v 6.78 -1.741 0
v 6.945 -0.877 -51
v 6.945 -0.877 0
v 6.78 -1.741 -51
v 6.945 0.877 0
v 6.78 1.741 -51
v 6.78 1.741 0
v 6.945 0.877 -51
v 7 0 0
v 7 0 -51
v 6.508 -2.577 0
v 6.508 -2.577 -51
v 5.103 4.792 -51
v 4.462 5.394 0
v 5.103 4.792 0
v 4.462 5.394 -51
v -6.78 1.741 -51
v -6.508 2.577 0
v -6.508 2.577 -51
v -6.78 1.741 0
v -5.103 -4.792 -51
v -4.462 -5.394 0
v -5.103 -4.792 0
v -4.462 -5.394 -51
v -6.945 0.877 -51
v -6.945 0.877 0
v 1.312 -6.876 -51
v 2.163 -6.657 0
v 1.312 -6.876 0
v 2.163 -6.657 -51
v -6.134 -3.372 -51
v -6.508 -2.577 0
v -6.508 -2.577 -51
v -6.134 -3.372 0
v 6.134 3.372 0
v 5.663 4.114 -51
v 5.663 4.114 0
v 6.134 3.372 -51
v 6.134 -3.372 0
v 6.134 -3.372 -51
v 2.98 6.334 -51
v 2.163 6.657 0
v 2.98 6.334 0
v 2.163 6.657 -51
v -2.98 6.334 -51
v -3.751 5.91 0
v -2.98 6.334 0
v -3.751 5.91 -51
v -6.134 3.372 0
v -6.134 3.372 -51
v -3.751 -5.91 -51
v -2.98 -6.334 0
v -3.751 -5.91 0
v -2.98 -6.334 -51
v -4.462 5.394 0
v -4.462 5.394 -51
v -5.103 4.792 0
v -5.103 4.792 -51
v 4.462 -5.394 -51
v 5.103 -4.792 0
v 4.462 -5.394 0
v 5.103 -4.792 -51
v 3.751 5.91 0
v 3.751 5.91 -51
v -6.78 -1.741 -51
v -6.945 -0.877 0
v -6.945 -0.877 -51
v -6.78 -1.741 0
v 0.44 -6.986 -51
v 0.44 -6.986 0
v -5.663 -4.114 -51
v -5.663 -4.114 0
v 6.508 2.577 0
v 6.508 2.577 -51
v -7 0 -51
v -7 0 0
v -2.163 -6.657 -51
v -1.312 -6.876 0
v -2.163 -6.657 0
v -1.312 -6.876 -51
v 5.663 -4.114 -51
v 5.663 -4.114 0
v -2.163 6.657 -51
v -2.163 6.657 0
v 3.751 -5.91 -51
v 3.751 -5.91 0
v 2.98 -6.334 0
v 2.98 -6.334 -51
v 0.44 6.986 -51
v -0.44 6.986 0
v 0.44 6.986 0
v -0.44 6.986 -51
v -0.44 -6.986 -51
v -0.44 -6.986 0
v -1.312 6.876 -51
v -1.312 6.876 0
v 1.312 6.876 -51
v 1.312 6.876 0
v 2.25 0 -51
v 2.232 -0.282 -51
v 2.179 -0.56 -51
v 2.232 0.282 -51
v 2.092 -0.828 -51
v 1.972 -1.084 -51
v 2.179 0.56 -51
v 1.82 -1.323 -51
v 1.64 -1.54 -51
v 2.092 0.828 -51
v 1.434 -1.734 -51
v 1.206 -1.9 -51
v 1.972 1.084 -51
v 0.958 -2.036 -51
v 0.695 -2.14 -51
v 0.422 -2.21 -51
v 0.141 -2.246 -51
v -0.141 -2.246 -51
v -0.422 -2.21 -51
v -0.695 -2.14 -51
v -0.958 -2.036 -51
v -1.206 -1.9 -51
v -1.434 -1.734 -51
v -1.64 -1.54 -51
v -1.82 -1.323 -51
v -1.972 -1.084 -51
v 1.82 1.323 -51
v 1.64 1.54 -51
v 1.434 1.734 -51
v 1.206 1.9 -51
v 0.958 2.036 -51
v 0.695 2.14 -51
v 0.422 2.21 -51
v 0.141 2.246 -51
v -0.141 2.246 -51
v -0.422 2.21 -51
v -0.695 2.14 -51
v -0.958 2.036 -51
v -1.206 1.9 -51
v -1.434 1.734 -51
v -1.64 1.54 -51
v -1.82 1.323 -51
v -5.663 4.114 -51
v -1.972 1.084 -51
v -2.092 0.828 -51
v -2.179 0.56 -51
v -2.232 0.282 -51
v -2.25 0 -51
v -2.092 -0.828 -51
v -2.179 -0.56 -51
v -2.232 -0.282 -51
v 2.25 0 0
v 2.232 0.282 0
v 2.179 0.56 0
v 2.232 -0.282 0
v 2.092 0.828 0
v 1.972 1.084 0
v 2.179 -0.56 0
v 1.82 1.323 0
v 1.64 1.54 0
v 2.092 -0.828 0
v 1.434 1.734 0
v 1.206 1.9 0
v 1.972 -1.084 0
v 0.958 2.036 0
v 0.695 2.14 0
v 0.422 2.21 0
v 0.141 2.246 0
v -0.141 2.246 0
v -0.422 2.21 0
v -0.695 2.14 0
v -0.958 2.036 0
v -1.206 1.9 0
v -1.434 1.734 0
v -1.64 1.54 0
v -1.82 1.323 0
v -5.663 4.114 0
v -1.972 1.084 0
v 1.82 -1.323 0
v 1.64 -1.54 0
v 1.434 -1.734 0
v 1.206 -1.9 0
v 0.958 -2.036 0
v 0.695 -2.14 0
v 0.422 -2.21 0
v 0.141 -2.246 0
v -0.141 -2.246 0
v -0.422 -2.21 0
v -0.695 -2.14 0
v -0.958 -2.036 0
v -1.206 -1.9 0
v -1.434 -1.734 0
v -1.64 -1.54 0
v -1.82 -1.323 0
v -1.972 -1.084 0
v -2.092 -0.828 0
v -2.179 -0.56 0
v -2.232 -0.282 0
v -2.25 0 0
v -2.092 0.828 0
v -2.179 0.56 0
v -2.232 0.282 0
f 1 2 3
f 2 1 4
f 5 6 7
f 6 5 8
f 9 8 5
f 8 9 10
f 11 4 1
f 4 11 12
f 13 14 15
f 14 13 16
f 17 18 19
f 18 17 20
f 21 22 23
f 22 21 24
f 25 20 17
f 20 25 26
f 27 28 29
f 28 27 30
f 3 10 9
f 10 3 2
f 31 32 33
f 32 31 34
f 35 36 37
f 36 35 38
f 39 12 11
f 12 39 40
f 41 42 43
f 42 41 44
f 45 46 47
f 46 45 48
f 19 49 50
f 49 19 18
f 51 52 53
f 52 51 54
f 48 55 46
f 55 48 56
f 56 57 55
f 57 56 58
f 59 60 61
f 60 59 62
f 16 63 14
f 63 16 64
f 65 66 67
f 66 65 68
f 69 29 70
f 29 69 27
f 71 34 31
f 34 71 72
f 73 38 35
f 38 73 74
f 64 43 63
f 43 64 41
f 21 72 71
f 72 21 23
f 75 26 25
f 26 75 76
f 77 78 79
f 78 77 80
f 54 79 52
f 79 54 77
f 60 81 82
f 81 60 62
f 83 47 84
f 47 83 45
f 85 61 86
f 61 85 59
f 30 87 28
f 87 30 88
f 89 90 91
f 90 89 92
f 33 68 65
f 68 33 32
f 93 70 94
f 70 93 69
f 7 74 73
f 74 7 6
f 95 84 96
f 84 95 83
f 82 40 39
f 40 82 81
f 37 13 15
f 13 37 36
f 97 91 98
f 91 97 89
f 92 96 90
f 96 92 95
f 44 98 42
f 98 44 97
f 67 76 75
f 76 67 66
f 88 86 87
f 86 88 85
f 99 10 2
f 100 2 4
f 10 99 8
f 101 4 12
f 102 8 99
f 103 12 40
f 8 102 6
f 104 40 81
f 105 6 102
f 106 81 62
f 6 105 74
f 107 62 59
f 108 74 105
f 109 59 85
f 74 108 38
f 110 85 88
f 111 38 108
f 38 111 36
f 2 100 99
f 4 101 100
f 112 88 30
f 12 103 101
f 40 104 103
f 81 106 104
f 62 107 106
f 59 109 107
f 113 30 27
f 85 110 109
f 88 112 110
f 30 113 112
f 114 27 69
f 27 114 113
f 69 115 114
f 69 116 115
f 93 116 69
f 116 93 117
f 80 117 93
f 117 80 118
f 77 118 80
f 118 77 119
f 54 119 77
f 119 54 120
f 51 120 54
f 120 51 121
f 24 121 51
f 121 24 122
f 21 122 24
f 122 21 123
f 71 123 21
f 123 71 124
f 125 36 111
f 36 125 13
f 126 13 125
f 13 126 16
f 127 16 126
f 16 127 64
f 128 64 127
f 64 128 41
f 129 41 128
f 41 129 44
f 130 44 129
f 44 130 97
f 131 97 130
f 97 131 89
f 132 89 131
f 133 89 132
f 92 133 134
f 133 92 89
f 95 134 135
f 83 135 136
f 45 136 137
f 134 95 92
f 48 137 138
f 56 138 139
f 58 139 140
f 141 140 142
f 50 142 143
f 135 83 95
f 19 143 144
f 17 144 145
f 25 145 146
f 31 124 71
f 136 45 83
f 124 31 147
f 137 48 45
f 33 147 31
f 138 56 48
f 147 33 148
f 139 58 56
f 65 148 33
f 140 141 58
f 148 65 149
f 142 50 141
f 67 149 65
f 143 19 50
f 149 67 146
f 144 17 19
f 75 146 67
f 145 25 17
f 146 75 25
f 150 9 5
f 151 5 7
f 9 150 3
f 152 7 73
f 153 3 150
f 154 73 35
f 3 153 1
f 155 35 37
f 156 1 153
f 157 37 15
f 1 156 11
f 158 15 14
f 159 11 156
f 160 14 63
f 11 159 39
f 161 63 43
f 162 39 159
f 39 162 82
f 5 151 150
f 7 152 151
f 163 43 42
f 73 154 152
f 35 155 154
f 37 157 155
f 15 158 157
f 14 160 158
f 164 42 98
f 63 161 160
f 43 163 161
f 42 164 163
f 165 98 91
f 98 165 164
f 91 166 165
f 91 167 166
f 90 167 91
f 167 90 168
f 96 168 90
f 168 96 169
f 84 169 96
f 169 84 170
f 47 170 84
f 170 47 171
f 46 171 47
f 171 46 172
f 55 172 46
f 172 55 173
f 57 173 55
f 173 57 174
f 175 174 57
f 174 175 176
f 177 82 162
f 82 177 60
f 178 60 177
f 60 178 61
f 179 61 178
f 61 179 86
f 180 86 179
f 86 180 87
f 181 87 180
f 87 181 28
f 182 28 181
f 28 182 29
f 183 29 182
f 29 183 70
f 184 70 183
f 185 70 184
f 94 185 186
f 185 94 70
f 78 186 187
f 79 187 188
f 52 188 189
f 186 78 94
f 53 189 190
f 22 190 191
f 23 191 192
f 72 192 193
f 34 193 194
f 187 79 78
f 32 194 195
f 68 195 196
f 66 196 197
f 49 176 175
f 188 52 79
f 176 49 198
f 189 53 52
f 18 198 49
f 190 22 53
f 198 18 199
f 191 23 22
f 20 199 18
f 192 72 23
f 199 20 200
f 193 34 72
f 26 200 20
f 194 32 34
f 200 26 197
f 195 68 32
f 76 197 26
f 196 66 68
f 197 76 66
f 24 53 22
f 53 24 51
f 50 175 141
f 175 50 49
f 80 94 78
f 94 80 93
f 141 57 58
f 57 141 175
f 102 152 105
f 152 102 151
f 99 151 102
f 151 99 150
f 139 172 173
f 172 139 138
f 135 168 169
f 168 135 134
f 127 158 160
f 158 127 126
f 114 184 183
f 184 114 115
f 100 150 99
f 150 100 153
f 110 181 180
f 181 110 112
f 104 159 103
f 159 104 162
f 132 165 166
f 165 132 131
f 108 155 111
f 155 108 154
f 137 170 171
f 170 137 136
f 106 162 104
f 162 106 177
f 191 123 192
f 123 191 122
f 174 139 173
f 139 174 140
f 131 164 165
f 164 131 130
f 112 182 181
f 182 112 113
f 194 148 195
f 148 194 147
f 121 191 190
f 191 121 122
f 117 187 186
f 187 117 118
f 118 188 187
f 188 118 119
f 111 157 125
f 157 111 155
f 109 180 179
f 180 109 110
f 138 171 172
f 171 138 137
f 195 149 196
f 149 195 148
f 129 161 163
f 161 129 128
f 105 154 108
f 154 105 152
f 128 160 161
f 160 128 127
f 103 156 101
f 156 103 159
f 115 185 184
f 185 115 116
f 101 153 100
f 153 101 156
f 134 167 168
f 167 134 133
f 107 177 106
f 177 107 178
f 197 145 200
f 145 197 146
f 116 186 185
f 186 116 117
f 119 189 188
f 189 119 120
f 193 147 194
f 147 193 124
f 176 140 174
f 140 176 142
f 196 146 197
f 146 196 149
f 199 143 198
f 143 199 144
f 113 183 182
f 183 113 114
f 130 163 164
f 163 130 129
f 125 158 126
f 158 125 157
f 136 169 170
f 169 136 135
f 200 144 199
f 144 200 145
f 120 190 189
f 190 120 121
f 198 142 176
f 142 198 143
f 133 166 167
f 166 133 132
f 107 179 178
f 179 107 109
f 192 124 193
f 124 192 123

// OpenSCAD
$fn = 50;


difference() {
	union() {
		translate(v = [0, 0, -51.0000000000]) {
			cylinder(h = 51, r = 7.0000000000);
		}
		cylinder(h = 0, r = 10.0000000000);
	}
	union() {
		#translate(v = [0, 0, -51]) {
			cylinder(h = 51, r = 2.2500000000);
		}
	}
}
